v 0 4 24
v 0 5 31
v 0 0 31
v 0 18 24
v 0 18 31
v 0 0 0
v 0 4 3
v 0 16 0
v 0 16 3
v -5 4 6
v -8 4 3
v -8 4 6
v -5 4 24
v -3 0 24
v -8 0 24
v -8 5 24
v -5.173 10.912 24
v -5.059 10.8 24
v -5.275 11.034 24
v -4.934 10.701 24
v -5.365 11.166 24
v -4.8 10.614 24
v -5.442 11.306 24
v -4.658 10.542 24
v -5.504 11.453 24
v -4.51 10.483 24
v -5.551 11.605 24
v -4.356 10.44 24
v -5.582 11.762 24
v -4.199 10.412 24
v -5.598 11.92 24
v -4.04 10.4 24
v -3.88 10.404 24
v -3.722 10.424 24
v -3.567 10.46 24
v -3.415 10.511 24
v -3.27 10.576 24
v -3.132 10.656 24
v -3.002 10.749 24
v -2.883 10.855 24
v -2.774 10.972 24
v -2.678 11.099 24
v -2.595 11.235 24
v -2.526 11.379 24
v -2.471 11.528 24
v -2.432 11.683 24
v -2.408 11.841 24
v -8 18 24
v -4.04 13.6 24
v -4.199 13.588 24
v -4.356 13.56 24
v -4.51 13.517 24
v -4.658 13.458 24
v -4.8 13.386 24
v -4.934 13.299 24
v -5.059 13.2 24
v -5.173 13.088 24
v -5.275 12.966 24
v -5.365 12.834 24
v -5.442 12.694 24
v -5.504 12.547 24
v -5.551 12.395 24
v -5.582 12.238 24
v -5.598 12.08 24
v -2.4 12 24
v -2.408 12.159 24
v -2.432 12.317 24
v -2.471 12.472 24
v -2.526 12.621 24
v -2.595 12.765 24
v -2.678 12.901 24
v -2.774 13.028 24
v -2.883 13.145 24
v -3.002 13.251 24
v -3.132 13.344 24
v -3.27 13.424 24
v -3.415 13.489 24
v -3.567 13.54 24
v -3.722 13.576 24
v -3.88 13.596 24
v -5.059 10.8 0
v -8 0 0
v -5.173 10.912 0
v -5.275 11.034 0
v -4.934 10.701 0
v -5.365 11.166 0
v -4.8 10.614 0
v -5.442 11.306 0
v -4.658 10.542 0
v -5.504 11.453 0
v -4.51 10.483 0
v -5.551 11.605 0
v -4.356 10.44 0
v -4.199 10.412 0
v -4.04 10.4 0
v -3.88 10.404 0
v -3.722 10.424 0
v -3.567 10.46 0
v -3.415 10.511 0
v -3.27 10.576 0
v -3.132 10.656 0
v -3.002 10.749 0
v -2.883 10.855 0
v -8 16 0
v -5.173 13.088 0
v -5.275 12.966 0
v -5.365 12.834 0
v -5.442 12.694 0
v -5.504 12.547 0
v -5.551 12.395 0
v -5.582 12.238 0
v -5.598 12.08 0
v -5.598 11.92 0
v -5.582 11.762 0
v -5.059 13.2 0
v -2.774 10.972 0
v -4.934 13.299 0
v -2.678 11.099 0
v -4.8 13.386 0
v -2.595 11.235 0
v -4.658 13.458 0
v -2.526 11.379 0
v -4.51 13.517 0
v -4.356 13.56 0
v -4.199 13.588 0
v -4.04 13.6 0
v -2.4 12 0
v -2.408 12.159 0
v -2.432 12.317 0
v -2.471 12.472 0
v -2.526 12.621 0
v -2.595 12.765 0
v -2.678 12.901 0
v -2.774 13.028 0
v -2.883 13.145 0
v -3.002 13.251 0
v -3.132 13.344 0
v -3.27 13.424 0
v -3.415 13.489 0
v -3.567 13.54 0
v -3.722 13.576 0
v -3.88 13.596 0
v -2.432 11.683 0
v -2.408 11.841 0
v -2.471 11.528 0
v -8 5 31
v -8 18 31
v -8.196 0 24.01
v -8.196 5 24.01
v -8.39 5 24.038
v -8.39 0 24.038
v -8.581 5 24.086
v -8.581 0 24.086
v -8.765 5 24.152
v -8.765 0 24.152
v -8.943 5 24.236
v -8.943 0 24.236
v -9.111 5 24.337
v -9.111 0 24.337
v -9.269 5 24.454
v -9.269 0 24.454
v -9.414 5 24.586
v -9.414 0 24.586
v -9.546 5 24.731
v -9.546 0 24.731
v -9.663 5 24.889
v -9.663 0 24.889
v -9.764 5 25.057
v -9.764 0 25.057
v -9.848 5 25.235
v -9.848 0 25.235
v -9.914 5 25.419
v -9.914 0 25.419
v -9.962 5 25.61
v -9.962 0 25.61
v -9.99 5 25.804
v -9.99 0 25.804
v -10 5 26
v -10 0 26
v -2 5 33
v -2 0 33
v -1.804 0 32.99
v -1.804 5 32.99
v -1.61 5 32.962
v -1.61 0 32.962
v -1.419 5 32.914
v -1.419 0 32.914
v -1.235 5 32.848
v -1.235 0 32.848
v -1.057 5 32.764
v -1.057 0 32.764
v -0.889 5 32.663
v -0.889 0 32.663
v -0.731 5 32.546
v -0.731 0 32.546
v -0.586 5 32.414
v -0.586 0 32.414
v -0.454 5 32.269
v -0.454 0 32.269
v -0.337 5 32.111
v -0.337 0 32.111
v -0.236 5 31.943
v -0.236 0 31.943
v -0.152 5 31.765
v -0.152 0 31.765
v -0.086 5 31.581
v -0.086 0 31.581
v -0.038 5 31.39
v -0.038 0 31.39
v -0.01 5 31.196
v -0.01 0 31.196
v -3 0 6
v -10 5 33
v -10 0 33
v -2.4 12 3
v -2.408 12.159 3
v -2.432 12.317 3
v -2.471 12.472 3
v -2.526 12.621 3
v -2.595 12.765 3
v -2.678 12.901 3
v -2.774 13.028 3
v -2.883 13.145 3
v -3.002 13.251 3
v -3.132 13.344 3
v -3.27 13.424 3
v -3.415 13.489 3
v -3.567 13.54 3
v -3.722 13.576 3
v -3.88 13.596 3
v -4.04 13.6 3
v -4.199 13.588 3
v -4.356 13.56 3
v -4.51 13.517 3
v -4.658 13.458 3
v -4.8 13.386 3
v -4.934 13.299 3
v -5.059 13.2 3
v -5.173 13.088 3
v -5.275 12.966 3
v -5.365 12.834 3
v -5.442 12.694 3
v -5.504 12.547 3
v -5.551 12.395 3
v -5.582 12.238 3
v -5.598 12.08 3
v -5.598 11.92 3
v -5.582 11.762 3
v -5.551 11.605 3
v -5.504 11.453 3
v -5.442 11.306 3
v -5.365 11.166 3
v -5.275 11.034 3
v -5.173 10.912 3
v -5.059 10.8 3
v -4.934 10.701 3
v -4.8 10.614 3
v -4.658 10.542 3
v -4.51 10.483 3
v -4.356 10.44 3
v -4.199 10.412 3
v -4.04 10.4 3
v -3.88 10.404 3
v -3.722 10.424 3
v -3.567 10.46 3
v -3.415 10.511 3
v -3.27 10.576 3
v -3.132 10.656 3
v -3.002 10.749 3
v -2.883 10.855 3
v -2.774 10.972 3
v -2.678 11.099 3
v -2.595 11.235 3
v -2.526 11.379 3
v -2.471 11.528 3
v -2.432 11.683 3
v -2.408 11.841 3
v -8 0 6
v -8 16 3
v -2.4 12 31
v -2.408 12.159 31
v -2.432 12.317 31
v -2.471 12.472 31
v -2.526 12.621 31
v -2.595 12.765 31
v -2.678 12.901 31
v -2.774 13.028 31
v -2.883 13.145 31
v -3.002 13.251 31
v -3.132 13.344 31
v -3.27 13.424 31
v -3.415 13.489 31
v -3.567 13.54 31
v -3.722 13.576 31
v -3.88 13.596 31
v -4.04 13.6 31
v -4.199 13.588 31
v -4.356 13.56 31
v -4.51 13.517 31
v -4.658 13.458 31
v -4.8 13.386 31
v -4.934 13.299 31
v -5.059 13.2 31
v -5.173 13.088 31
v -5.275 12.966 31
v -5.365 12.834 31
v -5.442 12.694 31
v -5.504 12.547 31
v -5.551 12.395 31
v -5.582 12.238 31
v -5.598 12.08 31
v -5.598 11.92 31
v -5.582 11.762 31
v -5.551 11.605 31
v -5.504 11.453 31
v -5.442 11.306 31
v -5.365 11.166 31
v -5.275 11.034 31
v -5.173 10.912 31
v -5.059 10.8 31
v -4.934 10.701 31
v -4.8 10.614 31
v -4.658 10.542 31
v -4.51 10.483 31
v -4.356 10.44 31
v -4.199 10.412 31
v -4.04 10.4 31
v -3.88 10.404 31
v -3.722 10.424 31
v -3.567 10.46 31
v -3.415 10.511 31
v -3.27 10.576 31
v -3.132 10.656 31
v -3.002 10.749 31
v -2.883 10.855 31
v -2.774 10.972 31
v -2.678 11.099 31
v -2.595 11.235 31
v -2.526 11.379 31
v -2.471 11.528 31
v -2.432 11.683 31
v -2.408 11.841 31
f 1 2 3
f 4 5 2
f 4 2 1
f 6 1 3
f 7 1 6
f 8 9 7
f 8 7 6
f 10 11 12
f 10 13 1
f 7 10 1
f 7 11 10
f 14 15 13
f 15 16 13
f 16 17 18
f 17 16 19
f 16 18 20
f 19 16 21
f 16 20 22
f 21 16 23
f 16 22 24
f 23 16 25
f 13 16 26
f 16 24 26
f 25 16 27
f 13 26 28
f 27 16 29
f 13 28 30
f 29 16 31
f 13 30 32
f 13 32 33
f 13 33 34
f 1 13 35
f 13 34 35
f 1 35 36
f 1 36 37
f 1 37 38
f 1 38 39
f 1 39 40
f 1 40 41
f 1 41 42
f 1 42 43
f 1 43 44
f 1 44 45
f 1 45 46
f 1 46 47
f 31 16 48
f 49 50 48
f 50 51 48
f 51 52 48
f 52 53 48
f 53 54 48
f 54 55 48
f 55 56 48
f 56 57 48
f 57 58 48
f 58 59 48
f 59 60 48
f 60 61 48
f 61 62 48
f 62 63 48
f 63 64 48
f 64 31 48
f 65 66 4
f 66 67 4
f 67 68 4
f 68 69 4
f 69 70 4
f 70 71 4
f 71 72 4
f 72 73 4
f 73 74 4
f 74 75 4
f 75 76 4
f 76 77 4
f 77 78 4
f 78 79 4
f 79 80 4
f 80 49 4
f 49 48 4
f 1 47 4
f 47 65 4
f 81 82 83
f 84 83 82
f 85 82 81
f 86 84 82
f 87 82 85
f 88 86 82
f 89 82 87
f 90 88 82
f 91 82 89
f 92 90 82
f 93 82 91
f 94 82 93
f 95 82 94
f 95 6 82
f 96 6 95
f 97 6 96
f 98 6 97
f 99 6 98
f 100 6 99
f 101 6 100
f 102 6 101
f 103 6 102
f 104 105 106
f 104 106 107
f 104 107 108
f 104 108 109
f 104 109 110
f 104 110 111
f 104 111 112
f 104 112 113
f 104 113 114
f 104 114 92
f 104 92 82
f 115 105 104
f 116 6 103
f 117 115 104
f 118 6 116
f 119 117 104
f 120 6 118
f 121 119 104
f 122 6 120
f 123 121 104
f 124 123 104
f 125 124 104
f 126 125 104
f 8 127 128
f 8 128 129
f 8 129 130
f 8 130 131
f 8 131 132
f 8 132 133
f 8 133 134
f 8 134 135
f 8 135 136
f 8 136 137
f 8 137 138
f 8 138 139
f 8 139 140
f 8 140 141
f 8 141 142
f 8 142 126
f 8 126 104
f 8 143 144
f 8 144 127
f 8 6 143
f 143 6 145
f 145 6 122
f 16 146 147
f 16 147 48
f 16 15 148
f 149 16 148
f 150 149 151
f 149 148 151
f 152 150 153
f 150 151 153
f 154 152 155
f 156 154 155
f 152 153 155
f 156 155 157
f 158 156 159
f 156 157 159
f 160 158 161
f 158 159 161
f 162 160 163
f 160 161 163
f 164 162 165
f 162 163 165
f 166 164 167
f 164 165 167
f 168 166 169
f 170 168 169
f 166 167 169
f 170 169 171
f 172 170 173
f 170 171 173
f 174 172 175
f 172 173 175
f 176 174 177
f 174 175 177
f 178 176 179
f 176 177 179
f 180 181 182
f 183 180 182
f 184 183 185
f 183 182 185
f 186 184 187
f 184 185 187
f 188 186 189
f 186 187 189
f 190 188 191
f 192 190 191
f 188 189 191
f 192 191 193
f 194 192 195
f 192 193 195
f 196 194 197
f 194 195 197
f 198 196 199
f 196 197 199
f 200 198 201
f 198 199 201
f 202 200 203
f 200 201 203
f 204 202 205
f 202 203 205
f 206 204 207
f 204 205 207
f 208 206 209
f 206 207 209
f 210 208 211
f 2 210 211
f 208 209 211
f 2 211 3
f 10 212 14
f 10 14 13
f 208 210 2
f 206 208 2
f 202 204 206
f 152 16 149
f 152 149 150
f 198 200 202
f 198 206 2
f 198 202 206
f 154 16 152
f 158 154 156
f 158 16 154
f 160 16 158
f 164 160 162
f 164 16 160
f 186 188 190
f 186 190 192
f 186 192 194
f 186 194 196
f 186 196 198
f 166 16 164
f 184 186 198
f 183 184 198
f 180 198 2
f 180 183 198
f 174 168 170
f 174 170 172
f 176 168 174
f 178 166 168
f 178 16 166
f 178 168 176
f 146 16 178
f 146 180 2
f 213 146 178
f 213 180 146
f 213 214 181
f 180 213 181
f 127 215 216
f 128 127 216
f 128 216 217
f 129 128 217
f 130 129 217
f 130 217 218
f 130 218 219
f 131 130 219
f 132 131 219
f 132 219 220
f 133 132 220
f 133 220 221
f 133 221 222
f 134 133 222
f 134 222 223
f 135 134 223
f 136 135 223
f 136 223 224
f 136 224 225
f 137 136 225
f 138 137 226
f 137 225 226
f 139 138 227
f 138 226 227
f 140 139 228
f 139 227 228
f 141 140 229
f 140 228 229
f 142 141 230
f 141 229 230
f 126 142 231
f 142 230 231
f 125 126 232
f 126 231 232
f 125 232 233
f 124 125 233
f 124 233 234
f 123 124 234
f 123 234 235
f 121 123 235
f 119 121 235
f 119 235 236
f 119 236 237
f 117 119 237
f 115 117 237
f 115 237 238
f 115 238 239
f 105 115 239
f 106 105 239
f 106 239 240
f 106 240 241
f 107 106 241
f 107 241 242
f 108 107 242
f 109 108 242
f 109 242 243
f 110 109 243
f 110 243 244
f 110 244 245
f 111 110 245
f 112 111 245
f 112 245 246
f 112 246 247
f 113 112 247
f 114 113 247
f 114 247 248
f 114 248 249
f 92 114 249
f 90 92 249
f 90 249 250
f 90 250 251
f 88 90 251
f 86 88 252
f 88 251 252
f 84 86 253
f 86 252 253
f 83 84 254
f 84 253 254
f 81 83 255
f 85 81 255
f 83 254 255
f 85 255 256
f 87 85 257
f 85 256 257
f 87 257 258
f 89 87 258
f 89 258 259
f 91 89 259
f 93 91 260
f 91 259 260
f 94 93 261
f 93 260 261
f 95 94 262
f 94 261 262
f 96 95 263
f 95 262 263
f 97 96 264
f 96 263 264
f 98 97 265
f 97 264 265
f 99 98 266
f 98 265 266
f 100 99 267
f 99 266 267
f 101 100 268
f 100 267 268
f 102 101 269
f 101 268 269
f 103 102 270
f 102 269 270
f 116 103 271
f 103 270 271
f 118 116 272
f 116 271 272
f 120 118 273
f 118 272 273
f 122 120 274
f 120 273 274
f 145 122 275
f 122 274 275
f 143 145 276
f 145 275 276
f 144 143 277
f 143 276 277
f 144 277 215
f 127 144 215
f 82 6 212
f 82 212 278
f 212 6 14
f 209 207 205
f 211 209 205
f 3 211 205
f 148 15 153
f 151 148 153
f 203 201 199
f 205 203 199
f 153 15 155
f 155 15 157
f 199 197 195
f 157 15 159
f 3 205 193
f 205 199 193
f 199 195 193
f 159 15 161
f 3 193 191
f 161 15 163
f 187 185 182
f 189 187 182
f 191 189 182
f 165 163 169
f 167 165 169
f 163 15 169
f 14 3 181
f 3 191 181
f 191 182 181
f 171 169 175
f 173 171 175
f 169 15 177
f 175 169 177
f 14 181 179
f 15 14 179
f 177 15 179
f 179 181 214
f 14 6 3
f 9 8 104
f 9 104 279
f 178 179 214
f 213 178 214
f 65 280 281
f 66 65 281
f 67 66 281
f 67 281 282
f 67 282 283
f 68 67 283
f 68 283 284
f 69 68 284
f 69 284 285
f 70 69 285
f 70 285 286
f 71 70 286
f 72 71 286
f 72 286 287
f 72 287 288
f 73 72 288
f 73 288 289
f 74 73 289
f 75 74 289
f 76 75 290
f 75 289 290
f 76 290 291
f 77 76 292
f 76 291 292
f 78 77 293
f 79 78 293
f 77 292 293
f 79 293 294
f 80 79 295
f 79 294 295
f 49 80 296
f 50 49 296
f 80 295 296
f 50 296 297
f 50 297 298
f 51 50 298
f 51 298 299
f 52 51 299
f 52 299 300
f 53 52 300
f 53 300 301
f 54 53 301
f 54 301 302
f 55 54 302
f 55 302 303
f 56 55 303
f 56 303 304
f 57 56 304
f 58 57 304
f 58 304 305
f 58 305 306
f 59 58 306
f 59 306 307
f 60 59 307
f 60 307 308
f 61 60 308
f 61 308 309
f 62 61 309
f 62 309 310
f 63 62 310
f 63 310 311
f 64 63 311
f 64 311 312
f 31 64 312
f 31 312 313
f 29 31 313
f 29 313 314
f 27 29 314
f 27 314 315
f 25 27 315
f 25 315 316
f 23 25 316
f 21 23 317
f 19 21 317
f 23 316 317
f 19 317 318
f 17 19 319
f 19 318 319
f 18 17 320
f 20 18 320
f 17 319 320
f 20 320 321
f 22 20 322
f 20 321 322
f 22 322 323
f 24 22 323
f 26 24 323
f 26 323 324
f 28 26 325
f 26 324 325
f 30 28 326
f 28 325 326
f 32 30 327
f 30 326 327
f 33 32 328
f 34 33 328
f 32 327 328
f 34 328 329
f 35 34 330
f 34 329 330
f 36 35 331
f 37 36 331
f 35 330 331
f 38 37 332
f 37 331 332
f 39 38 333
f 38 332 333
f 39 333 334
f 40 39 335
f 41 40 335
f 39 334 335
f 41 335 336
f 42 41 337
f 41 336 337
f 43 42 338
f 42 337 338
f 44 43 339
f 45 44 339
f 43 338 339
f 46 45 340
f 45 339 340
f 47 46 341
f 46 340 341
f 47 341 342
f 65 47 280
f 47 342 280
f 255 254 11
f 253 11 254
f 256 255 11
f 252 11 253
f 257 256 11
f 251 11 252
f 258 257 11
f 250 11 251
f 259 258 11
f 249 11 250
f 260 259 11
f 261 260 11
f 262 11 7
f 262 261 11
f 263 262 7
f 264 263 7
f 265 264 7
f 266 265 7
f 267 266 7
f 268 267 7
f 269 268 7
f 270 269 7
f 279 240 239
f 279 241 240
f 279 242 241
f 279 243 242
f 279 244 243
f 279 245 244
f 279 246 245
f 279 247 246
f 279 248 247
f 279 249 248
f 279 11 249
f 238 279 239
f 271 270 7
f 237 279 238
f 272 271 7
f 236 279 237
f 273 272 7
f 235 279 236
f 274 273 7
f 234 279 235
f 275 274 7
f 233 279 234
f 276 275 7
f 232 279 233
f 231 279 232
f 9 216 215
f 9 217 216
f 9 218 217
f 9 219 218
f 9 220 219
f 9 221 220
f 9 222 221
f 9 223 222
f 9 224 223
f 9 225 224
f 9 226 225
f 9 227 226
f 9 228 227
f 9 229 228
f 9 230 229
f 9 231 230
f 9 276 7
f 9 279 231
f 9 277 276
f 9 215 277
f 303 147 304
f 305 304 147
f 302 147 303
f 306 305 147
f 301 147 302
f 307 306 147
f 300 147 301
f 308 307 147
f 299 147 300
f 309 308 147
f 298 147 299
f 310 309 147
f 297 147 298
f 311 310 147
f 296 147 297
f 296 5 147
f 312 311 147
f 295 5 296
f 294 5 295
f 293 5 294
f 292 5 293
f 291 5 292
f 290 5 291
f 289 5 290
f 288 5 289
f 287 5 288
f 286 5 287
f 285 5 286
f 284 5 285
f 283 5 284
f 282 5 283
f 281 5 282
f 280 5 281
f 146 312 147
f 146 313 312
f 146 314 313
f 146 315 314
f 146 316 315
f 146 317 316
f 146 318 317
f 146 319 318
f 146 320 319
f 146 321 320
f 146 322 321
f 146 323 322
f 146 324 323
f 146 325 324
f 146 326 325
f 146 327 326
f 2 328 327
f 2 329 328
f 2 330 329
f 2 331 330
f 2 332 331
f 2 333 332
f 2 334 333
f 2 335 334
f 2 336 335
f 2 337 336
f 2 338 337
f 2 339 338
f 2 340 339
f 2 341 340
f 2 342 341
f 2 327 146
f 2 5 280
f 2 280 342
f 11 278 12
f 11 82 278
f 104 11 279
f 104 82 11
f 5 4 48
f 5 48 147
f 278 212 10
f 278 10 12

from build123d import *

# Parameters (mm, degrees)
BOSS_EXTRUDE1_DEPTH = 8
CUT_EXTRUDE2_DEPTH  = 21
BOSS_EXTRUDE2_DEPTH = 3
BOSS_EXTRUDE5_DEPTH = 5
SKETCH6_R           = 1.6
CUT_EXTRUDE3_DEPTH  = 38.215588132


with BuildPart() as part:
    # Sketch1 → Boss-Extrude1 (new body)
    with BuildSketch(Plane(origin=(0, 0, 0), x_dir=(0, 0, -1), z_dir=(1, 0, 0))):
        Polygon((0, 0), (0, 16), (-3, 16), (-3, 4), (-24, 4), (-24, 18), (-31, 18), (-31, 0), align=None)
    extrude(amount=-BOSS_EXTRUDE1_DEPTH)

    # Sketch5 → Cut-Extrude2 (cut)
    with BuildSketch(Plane.XY.offset(3)):
        Polygon((-8, 0), (-3, 0), (-5, 4), (-8, 4), align=None)
    extrude(amount=CUT_EXTRUDE2_DEPTH, mode=Mode.SUBTRACT)

    # Sketch8 → Boss-Extrude2 (add)
    with BuildSketch(Plane.XY.offset(3)):
        Polygon((-8, 4), (-5, 4), (-3, 0), (-8, 0), align=None)
    extrude(amount=BOSS_EXTRUDE2_DEPTH)

    # Sketch11 → Boss-Extrude5 (add)
    with BuildSketch(Plane.XZ):
        with BuildLine():
            Line((-10, 26), (-10, 33))
            Line((-10, 33), (-2, 33))
            ThreePointArc((-2, 33), (-0.585786438, 32.414213562), (0, 31))
            Line((0, 31), (-8, 31))
            Line((-8, 31), (-8, 24))
            ThreePointArc((-8, 24), (-9.414213562, 24.585786438), (-10, 26))
        make_face()
    extrude(amount=-BOSS_EXTRUDE5_DEPTH)

    # Sketch6 → Cut-Extrude3 (cut, through all)
    with BuildSketch(Plane.XY.offset(31)):
        with Locations((-4, 12)):
            Circle(SKETCH6_R)
    extrude(amount=-CUT_EXTRUDE3_DEPTH, mode=Mode.SUBTRACT)


solid = part.part
